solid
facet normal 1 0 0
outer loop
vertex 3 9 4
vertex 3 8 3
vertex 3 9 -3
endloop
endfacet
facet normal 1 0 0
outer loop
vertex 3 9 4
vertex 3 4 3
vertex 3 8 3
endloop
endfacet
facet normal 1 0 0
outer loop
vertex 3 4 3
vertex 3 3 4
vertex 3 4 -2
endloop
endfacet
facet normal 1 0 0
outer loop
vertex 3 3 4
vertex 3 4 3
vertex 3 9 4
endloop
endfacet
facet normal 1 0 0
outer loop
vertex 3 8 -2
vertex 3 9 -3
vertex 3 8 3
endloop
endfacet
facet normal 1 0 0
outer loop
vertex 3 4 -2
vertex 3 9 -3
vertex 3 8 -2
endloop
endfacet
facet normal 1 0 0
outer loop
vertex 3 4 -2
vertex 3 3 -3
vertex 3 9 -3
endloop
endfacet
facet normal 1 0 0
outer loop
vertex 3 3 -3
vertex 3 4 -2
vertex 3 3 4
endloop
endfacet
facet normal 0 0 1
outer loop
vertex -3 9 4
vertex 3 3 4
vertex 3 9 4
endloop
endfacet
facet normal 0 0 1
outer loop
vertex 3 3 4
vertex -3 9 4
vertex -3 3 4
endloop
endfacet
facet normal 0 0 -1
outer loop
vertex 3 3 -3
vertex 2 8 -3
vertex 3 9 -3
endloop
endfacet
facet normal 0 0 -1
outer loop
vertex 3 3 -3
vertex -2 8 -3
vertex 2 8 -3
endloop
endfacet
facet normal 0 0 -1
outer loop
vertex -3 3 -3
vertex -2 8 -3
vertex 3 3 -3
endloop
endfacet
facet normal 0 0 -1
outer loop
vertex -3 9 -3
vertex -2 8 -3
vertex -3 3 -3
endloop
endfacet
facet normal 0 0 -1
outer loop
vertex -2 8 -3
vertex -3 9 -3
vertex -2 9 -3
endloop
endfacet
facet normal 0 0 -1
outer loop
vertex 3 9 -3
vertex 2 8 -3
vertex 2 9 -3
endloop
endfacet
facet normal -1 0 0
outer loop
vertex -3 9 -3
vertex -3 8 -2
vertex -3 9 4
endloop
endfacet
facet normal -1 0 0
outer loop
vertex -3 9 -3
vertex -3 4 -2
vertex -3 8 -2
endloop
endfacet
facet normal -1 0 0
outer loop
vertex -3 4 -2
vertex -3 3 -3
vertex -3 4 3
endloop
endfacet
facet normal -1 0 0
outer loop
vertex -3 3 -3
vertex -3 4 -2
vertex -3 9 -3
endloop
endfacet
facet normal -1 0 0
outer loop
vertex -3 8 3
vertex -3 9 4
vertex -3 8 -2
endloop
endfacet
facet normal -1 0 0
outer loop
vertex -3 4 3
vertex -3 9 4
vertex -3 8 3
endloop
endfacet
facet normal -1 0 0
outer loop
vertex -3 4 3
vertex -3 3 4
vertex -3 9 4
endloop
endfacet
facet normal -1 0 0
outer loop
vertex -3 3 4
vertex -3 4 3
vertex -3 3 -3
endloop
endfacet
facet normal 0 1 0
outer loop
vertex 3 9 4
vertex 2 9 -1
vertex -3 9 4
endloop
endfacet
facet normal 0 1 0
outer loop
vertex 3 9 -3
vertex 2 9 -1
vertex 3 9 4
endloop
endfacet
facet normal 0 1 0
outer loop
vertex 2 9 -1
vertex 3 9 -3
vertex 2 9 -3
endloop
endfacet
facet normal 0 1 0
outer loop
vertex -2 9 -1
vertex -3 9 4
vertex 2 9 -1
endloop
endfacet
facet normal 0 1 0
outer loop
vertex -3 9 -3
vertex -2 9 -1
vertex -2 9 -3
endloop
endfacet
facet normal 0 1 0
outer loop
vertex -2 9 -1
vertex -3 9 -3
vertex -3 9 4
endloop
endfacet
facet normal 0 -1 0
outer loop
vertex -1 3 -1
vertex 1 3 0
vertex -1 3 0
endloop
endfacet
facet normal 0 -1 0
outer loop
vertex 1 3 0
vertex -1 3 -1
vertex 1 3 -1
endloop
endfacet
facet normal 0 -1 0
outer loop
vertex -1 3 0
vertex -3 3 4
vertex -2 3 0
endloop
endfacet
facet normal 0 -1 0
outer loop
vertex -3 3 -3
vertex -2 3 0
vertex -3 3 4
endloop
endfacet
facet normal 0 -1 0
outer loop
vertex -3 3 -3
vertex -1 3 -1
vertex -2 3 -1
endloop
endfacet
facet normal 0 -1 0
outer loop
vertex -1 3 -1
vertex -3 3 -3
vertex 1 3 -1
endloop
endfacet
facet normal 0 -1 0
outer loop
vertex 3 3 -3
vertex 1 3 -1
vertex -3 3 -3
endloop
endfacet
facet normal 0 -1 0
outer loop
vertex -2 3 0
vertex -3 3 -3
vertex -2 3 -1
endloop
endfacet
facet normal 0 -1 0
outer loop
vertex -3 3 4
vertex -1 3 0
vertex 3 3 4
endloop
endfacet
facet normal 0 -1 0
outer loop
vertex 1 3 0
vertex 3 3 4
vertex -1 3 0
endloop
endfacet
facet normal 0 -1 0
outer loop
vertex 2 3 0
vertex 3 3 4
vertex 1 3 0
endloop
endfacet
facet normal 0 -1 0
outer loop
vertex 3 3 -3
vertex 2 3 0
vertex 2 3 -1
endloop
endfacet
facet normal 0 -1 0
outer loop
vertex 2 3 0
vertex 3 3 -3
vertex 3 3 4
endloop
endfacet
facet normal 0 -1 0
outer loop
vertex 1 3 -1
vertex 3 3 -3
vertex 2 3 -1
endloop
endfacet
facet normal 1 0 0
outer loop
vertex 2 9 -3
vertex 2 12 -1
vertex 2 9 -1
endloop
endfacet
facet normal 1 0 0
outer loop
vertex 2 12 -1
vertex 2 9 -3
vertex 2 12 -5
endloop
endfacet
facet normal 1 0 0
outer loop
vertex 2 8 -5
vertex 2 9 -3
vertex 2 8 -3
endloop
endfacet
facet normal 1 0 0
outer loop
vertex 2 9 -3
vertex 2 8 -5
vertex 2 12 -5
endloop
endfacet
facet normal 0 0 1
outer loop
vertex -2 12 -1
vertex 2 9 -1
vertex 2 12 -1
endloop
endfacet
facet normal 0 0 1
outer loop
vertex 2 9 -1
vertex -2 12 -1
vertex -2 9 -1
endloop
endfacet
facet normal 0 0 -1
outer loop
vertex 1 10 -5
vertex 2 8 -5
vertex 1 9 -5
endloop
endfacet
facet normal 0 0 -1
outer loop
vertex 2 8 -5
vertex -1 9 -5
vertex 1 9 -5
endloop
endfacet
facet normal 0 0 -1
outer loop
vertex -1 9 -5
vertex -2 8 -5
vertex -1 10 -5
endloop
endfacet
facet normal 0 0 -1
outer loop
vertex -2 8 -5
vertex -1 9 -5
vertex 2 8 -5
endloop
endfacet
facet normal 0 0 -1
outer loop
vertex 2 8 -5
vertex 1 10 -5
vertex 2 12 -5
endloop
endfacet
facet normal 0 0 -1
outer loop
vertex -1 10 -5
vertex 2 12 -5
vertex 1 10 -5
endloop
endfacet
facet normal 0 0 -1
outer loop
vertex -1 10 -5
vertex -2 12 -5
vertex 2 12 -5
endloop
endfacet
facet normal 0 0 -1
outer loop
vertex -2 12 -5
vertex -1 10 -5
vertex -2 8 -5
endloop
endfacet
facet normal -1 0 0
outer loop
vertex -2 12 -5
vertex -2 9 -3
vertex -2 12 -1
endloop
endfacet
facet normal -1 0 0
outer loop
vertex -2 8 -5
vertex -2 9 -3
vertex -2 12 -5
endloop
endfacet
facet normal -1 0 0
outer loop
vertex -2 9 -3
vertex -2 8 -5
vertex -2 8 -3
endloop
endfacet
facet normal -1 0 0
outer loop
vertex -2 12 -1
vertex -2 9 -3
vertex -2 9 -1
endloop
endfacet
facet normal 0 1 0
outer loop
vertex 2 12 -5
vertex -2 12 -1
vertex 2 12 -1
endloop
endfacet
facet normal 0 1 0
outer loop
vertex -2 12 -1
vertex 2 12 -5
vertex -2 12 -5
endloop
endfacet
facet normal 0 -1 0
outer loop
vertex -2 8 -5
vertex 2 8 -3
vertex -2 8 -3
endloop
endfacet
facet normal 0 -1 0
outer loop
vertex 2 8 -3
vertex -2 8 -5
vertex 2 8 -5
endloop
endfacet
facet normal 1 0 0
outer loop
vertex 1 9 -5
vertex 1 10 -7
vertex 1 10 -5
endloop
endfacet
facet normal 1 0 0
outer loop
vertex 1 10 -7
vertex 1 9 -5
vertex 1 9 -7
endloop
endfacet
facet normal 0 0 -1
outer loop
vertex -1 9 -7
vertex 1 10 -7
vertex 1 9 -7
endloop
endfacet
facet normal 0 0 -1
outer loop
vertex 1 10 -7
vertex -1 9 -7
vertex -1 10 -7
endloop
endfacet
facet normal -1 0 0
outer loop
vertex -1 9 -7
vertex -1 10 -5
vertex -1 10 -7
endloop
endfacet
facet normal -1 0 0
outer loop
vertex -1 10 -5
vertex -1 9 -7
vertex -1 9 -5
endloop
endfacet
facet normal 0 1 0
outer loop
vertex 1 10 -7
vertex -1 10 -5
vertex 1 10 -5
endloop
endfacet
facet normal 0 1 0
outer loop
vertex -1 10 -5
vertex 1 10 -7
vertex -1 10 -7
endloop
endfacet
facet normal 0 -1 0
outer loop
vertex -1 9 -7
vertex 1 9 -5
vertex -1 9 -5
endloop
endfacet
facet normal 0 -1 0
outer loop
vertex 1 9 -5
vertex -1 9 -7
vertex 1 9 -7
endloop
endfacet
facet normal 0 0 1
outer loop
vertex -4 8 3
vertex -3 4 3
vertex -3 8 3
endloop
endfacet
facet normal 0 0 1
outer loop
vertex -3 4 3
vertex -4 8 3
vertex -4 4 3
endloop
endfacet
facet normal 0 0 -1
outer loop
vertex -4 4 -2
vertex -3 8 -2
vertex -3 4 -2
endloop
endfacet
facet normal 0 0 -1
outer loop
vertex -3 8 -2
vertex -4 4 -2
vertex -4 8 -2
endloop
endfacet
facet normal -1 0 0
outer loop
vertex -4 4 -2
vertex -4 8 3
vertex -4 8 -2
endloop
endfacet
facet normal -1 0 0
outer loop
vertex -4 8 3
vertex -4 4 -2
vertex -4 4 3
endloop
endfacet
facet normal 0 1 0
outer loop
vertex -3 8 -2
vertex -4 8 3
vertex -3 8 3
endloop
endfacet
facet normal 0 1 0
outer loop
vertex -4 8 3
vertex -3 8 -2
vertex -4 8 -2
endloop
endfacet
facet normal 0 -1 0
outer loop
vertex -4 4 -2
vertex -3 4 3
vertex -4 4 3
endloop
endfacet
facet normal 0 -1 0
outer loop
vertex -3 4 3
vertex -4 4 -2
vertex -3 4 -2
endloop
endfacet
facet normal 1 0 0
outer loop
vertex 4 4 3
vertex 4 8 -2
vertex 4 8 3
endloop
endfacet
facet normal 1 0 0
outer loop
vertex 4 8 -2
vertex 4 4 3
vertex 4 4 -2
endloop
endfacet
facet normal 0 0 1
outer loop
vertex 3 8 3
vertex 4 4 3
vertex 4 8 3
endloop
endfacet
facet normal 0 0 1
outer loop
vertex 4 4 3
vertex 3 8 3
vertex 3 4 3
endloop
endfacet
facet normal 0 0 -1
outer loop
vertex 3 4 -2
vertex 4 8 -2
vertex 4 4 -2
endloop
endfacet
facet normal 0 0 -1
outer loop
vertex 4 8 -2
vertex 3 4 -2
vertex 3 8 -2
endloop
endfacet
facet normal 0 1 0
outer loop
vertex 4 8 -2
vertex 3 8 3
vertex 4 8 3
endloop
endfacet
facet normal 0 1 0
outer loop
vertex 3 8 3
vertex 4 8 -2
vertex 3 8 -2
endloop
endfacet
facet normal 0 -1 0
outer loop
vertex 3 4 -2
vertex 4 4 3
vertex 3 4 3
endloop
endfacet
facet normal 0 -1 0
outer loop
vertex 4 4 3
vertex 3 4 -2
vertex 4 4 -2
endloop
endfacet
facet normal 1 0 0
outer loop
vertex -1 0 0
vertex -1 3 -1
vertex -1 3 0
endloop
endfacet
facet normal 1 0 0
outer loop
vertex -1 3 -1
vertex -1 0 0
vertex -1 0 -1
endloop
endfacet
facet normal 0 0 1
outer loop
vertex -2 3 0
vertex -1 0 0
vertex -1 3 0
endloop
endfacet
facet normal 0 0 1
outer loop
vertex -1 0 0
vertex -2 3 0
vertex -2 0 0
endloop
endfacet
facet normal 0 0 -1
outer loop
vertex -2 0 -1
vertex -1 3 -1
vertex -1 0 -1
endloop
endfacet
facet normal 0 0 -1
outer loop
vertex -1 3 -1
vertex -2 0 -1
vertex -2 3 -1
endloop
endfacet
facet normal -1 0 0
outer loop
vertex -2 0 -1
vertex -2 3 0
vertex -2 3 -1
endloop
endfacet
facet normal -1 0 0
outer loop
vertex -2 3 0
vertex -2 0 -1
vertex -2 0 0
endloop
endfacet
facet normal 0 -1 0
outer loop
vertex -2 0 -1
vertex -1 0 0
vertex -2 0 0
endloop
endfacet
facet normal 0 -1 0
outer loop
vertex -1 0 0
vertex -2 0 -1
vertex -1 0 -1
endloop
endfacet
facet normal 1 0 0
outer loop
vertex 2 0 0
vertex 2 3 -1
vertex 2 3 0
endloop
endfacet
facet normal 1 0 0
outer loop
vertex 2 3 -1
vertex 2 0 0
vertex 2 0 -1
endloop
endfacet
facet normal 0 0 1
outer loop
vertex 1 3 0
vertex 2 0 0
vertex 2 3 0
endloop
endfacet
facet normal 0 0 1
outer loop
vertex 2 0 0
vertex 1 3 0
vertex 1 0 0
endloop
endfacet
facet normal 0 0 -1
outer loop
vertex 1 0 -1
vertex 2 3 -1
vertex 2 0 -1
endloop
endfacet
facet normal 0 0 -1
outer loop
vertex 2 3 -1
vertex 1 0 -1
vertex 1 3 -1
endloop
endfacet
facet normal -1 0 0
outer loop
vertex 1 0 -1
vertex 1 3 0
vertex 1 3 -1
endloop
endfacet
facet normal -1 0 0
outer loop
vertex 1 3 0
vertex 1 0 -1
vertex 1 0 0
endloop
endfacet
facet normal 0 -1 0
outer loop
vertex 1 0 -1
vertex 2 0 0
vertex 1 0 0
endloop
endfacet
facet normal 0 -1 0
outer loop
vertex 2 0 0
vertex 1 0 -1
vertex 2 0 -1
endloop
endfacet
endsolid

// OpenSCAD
// file: lib.scad
// Voxcraft box-model library (OpenSCAD).
//
// Conventions: 1 unit = 1 texture pixel = 1/16 block. Origin = entity feet centre. +Y up,
// the model faces -Z (forward). Pivots are in model space.
//
// vx_bone() and vx_box() both produce geometry (so the model can be previewed/rendered and its
// geometry validated) AND echo a machine-readable record that tools/scad_export.py turns into
// the runtime box model. The .scad files are the single editable source of truth.

// Declare a bone: name, parent ("" = root), pivot point the bone rotates around.
module vx_bone(name, parent, pivot) {
    echo("VXBONE", name, parent, pivot);
    %translate(pivot) sphere(0.5, $fn = 6);   // preview-only marker
}

// A textured box attached to a bone. tex: texture for all faces; front: texture for the -Z face.
module vx_box(bone, min, size, tex, front = "") {
    echo("VXBOX", bone, min, size, tex, front == "" ? tex : front);
    translate(min) cube(size);
}
// main file
// Puffbird: a round, flightless-ish bird that flutters when startled. Original Voxcraft creature.
include <lib.scad>

vx_bone("body", "", [0, 5, 0]);
vx_bone("head", "body", [0, 9, -2]);
vx_bone("wing_l", "body", [-3, 8, 0]);
vx_bone("wing_r", "body", [ 3, 8, 0]);
vx_bone("leg_l", "body", [-1.5, 3, 0]);
vx_bone("leg_r", "body", [ 1.5, 3, 0]);

vx_box("body", [-3, 3, -3], [6, 6, 7], "puffbird_feathers");
vx_box("head", [-2, 8, -5], [4, 4, 4], "puffbird_feathers", "puffbird_face");
vx_box("head", [-1, 9, -7], [2, 1, 2], "puffbird_beak");
vx_box("wing_l", [-4, 4, -2], [1, 4, 5], "puffbird_wing");
vx_box("wing_r", [ 3, 4, -2], [1, 4, 5], "puffbird_wing");
vx_box("leg_l", [-2, 0, -1], [1, 3, 1], "puffbird_beak");
vx_box("leg_r", [ 1, 0, -1], [1, 3, 1], "puffbird_beak");
